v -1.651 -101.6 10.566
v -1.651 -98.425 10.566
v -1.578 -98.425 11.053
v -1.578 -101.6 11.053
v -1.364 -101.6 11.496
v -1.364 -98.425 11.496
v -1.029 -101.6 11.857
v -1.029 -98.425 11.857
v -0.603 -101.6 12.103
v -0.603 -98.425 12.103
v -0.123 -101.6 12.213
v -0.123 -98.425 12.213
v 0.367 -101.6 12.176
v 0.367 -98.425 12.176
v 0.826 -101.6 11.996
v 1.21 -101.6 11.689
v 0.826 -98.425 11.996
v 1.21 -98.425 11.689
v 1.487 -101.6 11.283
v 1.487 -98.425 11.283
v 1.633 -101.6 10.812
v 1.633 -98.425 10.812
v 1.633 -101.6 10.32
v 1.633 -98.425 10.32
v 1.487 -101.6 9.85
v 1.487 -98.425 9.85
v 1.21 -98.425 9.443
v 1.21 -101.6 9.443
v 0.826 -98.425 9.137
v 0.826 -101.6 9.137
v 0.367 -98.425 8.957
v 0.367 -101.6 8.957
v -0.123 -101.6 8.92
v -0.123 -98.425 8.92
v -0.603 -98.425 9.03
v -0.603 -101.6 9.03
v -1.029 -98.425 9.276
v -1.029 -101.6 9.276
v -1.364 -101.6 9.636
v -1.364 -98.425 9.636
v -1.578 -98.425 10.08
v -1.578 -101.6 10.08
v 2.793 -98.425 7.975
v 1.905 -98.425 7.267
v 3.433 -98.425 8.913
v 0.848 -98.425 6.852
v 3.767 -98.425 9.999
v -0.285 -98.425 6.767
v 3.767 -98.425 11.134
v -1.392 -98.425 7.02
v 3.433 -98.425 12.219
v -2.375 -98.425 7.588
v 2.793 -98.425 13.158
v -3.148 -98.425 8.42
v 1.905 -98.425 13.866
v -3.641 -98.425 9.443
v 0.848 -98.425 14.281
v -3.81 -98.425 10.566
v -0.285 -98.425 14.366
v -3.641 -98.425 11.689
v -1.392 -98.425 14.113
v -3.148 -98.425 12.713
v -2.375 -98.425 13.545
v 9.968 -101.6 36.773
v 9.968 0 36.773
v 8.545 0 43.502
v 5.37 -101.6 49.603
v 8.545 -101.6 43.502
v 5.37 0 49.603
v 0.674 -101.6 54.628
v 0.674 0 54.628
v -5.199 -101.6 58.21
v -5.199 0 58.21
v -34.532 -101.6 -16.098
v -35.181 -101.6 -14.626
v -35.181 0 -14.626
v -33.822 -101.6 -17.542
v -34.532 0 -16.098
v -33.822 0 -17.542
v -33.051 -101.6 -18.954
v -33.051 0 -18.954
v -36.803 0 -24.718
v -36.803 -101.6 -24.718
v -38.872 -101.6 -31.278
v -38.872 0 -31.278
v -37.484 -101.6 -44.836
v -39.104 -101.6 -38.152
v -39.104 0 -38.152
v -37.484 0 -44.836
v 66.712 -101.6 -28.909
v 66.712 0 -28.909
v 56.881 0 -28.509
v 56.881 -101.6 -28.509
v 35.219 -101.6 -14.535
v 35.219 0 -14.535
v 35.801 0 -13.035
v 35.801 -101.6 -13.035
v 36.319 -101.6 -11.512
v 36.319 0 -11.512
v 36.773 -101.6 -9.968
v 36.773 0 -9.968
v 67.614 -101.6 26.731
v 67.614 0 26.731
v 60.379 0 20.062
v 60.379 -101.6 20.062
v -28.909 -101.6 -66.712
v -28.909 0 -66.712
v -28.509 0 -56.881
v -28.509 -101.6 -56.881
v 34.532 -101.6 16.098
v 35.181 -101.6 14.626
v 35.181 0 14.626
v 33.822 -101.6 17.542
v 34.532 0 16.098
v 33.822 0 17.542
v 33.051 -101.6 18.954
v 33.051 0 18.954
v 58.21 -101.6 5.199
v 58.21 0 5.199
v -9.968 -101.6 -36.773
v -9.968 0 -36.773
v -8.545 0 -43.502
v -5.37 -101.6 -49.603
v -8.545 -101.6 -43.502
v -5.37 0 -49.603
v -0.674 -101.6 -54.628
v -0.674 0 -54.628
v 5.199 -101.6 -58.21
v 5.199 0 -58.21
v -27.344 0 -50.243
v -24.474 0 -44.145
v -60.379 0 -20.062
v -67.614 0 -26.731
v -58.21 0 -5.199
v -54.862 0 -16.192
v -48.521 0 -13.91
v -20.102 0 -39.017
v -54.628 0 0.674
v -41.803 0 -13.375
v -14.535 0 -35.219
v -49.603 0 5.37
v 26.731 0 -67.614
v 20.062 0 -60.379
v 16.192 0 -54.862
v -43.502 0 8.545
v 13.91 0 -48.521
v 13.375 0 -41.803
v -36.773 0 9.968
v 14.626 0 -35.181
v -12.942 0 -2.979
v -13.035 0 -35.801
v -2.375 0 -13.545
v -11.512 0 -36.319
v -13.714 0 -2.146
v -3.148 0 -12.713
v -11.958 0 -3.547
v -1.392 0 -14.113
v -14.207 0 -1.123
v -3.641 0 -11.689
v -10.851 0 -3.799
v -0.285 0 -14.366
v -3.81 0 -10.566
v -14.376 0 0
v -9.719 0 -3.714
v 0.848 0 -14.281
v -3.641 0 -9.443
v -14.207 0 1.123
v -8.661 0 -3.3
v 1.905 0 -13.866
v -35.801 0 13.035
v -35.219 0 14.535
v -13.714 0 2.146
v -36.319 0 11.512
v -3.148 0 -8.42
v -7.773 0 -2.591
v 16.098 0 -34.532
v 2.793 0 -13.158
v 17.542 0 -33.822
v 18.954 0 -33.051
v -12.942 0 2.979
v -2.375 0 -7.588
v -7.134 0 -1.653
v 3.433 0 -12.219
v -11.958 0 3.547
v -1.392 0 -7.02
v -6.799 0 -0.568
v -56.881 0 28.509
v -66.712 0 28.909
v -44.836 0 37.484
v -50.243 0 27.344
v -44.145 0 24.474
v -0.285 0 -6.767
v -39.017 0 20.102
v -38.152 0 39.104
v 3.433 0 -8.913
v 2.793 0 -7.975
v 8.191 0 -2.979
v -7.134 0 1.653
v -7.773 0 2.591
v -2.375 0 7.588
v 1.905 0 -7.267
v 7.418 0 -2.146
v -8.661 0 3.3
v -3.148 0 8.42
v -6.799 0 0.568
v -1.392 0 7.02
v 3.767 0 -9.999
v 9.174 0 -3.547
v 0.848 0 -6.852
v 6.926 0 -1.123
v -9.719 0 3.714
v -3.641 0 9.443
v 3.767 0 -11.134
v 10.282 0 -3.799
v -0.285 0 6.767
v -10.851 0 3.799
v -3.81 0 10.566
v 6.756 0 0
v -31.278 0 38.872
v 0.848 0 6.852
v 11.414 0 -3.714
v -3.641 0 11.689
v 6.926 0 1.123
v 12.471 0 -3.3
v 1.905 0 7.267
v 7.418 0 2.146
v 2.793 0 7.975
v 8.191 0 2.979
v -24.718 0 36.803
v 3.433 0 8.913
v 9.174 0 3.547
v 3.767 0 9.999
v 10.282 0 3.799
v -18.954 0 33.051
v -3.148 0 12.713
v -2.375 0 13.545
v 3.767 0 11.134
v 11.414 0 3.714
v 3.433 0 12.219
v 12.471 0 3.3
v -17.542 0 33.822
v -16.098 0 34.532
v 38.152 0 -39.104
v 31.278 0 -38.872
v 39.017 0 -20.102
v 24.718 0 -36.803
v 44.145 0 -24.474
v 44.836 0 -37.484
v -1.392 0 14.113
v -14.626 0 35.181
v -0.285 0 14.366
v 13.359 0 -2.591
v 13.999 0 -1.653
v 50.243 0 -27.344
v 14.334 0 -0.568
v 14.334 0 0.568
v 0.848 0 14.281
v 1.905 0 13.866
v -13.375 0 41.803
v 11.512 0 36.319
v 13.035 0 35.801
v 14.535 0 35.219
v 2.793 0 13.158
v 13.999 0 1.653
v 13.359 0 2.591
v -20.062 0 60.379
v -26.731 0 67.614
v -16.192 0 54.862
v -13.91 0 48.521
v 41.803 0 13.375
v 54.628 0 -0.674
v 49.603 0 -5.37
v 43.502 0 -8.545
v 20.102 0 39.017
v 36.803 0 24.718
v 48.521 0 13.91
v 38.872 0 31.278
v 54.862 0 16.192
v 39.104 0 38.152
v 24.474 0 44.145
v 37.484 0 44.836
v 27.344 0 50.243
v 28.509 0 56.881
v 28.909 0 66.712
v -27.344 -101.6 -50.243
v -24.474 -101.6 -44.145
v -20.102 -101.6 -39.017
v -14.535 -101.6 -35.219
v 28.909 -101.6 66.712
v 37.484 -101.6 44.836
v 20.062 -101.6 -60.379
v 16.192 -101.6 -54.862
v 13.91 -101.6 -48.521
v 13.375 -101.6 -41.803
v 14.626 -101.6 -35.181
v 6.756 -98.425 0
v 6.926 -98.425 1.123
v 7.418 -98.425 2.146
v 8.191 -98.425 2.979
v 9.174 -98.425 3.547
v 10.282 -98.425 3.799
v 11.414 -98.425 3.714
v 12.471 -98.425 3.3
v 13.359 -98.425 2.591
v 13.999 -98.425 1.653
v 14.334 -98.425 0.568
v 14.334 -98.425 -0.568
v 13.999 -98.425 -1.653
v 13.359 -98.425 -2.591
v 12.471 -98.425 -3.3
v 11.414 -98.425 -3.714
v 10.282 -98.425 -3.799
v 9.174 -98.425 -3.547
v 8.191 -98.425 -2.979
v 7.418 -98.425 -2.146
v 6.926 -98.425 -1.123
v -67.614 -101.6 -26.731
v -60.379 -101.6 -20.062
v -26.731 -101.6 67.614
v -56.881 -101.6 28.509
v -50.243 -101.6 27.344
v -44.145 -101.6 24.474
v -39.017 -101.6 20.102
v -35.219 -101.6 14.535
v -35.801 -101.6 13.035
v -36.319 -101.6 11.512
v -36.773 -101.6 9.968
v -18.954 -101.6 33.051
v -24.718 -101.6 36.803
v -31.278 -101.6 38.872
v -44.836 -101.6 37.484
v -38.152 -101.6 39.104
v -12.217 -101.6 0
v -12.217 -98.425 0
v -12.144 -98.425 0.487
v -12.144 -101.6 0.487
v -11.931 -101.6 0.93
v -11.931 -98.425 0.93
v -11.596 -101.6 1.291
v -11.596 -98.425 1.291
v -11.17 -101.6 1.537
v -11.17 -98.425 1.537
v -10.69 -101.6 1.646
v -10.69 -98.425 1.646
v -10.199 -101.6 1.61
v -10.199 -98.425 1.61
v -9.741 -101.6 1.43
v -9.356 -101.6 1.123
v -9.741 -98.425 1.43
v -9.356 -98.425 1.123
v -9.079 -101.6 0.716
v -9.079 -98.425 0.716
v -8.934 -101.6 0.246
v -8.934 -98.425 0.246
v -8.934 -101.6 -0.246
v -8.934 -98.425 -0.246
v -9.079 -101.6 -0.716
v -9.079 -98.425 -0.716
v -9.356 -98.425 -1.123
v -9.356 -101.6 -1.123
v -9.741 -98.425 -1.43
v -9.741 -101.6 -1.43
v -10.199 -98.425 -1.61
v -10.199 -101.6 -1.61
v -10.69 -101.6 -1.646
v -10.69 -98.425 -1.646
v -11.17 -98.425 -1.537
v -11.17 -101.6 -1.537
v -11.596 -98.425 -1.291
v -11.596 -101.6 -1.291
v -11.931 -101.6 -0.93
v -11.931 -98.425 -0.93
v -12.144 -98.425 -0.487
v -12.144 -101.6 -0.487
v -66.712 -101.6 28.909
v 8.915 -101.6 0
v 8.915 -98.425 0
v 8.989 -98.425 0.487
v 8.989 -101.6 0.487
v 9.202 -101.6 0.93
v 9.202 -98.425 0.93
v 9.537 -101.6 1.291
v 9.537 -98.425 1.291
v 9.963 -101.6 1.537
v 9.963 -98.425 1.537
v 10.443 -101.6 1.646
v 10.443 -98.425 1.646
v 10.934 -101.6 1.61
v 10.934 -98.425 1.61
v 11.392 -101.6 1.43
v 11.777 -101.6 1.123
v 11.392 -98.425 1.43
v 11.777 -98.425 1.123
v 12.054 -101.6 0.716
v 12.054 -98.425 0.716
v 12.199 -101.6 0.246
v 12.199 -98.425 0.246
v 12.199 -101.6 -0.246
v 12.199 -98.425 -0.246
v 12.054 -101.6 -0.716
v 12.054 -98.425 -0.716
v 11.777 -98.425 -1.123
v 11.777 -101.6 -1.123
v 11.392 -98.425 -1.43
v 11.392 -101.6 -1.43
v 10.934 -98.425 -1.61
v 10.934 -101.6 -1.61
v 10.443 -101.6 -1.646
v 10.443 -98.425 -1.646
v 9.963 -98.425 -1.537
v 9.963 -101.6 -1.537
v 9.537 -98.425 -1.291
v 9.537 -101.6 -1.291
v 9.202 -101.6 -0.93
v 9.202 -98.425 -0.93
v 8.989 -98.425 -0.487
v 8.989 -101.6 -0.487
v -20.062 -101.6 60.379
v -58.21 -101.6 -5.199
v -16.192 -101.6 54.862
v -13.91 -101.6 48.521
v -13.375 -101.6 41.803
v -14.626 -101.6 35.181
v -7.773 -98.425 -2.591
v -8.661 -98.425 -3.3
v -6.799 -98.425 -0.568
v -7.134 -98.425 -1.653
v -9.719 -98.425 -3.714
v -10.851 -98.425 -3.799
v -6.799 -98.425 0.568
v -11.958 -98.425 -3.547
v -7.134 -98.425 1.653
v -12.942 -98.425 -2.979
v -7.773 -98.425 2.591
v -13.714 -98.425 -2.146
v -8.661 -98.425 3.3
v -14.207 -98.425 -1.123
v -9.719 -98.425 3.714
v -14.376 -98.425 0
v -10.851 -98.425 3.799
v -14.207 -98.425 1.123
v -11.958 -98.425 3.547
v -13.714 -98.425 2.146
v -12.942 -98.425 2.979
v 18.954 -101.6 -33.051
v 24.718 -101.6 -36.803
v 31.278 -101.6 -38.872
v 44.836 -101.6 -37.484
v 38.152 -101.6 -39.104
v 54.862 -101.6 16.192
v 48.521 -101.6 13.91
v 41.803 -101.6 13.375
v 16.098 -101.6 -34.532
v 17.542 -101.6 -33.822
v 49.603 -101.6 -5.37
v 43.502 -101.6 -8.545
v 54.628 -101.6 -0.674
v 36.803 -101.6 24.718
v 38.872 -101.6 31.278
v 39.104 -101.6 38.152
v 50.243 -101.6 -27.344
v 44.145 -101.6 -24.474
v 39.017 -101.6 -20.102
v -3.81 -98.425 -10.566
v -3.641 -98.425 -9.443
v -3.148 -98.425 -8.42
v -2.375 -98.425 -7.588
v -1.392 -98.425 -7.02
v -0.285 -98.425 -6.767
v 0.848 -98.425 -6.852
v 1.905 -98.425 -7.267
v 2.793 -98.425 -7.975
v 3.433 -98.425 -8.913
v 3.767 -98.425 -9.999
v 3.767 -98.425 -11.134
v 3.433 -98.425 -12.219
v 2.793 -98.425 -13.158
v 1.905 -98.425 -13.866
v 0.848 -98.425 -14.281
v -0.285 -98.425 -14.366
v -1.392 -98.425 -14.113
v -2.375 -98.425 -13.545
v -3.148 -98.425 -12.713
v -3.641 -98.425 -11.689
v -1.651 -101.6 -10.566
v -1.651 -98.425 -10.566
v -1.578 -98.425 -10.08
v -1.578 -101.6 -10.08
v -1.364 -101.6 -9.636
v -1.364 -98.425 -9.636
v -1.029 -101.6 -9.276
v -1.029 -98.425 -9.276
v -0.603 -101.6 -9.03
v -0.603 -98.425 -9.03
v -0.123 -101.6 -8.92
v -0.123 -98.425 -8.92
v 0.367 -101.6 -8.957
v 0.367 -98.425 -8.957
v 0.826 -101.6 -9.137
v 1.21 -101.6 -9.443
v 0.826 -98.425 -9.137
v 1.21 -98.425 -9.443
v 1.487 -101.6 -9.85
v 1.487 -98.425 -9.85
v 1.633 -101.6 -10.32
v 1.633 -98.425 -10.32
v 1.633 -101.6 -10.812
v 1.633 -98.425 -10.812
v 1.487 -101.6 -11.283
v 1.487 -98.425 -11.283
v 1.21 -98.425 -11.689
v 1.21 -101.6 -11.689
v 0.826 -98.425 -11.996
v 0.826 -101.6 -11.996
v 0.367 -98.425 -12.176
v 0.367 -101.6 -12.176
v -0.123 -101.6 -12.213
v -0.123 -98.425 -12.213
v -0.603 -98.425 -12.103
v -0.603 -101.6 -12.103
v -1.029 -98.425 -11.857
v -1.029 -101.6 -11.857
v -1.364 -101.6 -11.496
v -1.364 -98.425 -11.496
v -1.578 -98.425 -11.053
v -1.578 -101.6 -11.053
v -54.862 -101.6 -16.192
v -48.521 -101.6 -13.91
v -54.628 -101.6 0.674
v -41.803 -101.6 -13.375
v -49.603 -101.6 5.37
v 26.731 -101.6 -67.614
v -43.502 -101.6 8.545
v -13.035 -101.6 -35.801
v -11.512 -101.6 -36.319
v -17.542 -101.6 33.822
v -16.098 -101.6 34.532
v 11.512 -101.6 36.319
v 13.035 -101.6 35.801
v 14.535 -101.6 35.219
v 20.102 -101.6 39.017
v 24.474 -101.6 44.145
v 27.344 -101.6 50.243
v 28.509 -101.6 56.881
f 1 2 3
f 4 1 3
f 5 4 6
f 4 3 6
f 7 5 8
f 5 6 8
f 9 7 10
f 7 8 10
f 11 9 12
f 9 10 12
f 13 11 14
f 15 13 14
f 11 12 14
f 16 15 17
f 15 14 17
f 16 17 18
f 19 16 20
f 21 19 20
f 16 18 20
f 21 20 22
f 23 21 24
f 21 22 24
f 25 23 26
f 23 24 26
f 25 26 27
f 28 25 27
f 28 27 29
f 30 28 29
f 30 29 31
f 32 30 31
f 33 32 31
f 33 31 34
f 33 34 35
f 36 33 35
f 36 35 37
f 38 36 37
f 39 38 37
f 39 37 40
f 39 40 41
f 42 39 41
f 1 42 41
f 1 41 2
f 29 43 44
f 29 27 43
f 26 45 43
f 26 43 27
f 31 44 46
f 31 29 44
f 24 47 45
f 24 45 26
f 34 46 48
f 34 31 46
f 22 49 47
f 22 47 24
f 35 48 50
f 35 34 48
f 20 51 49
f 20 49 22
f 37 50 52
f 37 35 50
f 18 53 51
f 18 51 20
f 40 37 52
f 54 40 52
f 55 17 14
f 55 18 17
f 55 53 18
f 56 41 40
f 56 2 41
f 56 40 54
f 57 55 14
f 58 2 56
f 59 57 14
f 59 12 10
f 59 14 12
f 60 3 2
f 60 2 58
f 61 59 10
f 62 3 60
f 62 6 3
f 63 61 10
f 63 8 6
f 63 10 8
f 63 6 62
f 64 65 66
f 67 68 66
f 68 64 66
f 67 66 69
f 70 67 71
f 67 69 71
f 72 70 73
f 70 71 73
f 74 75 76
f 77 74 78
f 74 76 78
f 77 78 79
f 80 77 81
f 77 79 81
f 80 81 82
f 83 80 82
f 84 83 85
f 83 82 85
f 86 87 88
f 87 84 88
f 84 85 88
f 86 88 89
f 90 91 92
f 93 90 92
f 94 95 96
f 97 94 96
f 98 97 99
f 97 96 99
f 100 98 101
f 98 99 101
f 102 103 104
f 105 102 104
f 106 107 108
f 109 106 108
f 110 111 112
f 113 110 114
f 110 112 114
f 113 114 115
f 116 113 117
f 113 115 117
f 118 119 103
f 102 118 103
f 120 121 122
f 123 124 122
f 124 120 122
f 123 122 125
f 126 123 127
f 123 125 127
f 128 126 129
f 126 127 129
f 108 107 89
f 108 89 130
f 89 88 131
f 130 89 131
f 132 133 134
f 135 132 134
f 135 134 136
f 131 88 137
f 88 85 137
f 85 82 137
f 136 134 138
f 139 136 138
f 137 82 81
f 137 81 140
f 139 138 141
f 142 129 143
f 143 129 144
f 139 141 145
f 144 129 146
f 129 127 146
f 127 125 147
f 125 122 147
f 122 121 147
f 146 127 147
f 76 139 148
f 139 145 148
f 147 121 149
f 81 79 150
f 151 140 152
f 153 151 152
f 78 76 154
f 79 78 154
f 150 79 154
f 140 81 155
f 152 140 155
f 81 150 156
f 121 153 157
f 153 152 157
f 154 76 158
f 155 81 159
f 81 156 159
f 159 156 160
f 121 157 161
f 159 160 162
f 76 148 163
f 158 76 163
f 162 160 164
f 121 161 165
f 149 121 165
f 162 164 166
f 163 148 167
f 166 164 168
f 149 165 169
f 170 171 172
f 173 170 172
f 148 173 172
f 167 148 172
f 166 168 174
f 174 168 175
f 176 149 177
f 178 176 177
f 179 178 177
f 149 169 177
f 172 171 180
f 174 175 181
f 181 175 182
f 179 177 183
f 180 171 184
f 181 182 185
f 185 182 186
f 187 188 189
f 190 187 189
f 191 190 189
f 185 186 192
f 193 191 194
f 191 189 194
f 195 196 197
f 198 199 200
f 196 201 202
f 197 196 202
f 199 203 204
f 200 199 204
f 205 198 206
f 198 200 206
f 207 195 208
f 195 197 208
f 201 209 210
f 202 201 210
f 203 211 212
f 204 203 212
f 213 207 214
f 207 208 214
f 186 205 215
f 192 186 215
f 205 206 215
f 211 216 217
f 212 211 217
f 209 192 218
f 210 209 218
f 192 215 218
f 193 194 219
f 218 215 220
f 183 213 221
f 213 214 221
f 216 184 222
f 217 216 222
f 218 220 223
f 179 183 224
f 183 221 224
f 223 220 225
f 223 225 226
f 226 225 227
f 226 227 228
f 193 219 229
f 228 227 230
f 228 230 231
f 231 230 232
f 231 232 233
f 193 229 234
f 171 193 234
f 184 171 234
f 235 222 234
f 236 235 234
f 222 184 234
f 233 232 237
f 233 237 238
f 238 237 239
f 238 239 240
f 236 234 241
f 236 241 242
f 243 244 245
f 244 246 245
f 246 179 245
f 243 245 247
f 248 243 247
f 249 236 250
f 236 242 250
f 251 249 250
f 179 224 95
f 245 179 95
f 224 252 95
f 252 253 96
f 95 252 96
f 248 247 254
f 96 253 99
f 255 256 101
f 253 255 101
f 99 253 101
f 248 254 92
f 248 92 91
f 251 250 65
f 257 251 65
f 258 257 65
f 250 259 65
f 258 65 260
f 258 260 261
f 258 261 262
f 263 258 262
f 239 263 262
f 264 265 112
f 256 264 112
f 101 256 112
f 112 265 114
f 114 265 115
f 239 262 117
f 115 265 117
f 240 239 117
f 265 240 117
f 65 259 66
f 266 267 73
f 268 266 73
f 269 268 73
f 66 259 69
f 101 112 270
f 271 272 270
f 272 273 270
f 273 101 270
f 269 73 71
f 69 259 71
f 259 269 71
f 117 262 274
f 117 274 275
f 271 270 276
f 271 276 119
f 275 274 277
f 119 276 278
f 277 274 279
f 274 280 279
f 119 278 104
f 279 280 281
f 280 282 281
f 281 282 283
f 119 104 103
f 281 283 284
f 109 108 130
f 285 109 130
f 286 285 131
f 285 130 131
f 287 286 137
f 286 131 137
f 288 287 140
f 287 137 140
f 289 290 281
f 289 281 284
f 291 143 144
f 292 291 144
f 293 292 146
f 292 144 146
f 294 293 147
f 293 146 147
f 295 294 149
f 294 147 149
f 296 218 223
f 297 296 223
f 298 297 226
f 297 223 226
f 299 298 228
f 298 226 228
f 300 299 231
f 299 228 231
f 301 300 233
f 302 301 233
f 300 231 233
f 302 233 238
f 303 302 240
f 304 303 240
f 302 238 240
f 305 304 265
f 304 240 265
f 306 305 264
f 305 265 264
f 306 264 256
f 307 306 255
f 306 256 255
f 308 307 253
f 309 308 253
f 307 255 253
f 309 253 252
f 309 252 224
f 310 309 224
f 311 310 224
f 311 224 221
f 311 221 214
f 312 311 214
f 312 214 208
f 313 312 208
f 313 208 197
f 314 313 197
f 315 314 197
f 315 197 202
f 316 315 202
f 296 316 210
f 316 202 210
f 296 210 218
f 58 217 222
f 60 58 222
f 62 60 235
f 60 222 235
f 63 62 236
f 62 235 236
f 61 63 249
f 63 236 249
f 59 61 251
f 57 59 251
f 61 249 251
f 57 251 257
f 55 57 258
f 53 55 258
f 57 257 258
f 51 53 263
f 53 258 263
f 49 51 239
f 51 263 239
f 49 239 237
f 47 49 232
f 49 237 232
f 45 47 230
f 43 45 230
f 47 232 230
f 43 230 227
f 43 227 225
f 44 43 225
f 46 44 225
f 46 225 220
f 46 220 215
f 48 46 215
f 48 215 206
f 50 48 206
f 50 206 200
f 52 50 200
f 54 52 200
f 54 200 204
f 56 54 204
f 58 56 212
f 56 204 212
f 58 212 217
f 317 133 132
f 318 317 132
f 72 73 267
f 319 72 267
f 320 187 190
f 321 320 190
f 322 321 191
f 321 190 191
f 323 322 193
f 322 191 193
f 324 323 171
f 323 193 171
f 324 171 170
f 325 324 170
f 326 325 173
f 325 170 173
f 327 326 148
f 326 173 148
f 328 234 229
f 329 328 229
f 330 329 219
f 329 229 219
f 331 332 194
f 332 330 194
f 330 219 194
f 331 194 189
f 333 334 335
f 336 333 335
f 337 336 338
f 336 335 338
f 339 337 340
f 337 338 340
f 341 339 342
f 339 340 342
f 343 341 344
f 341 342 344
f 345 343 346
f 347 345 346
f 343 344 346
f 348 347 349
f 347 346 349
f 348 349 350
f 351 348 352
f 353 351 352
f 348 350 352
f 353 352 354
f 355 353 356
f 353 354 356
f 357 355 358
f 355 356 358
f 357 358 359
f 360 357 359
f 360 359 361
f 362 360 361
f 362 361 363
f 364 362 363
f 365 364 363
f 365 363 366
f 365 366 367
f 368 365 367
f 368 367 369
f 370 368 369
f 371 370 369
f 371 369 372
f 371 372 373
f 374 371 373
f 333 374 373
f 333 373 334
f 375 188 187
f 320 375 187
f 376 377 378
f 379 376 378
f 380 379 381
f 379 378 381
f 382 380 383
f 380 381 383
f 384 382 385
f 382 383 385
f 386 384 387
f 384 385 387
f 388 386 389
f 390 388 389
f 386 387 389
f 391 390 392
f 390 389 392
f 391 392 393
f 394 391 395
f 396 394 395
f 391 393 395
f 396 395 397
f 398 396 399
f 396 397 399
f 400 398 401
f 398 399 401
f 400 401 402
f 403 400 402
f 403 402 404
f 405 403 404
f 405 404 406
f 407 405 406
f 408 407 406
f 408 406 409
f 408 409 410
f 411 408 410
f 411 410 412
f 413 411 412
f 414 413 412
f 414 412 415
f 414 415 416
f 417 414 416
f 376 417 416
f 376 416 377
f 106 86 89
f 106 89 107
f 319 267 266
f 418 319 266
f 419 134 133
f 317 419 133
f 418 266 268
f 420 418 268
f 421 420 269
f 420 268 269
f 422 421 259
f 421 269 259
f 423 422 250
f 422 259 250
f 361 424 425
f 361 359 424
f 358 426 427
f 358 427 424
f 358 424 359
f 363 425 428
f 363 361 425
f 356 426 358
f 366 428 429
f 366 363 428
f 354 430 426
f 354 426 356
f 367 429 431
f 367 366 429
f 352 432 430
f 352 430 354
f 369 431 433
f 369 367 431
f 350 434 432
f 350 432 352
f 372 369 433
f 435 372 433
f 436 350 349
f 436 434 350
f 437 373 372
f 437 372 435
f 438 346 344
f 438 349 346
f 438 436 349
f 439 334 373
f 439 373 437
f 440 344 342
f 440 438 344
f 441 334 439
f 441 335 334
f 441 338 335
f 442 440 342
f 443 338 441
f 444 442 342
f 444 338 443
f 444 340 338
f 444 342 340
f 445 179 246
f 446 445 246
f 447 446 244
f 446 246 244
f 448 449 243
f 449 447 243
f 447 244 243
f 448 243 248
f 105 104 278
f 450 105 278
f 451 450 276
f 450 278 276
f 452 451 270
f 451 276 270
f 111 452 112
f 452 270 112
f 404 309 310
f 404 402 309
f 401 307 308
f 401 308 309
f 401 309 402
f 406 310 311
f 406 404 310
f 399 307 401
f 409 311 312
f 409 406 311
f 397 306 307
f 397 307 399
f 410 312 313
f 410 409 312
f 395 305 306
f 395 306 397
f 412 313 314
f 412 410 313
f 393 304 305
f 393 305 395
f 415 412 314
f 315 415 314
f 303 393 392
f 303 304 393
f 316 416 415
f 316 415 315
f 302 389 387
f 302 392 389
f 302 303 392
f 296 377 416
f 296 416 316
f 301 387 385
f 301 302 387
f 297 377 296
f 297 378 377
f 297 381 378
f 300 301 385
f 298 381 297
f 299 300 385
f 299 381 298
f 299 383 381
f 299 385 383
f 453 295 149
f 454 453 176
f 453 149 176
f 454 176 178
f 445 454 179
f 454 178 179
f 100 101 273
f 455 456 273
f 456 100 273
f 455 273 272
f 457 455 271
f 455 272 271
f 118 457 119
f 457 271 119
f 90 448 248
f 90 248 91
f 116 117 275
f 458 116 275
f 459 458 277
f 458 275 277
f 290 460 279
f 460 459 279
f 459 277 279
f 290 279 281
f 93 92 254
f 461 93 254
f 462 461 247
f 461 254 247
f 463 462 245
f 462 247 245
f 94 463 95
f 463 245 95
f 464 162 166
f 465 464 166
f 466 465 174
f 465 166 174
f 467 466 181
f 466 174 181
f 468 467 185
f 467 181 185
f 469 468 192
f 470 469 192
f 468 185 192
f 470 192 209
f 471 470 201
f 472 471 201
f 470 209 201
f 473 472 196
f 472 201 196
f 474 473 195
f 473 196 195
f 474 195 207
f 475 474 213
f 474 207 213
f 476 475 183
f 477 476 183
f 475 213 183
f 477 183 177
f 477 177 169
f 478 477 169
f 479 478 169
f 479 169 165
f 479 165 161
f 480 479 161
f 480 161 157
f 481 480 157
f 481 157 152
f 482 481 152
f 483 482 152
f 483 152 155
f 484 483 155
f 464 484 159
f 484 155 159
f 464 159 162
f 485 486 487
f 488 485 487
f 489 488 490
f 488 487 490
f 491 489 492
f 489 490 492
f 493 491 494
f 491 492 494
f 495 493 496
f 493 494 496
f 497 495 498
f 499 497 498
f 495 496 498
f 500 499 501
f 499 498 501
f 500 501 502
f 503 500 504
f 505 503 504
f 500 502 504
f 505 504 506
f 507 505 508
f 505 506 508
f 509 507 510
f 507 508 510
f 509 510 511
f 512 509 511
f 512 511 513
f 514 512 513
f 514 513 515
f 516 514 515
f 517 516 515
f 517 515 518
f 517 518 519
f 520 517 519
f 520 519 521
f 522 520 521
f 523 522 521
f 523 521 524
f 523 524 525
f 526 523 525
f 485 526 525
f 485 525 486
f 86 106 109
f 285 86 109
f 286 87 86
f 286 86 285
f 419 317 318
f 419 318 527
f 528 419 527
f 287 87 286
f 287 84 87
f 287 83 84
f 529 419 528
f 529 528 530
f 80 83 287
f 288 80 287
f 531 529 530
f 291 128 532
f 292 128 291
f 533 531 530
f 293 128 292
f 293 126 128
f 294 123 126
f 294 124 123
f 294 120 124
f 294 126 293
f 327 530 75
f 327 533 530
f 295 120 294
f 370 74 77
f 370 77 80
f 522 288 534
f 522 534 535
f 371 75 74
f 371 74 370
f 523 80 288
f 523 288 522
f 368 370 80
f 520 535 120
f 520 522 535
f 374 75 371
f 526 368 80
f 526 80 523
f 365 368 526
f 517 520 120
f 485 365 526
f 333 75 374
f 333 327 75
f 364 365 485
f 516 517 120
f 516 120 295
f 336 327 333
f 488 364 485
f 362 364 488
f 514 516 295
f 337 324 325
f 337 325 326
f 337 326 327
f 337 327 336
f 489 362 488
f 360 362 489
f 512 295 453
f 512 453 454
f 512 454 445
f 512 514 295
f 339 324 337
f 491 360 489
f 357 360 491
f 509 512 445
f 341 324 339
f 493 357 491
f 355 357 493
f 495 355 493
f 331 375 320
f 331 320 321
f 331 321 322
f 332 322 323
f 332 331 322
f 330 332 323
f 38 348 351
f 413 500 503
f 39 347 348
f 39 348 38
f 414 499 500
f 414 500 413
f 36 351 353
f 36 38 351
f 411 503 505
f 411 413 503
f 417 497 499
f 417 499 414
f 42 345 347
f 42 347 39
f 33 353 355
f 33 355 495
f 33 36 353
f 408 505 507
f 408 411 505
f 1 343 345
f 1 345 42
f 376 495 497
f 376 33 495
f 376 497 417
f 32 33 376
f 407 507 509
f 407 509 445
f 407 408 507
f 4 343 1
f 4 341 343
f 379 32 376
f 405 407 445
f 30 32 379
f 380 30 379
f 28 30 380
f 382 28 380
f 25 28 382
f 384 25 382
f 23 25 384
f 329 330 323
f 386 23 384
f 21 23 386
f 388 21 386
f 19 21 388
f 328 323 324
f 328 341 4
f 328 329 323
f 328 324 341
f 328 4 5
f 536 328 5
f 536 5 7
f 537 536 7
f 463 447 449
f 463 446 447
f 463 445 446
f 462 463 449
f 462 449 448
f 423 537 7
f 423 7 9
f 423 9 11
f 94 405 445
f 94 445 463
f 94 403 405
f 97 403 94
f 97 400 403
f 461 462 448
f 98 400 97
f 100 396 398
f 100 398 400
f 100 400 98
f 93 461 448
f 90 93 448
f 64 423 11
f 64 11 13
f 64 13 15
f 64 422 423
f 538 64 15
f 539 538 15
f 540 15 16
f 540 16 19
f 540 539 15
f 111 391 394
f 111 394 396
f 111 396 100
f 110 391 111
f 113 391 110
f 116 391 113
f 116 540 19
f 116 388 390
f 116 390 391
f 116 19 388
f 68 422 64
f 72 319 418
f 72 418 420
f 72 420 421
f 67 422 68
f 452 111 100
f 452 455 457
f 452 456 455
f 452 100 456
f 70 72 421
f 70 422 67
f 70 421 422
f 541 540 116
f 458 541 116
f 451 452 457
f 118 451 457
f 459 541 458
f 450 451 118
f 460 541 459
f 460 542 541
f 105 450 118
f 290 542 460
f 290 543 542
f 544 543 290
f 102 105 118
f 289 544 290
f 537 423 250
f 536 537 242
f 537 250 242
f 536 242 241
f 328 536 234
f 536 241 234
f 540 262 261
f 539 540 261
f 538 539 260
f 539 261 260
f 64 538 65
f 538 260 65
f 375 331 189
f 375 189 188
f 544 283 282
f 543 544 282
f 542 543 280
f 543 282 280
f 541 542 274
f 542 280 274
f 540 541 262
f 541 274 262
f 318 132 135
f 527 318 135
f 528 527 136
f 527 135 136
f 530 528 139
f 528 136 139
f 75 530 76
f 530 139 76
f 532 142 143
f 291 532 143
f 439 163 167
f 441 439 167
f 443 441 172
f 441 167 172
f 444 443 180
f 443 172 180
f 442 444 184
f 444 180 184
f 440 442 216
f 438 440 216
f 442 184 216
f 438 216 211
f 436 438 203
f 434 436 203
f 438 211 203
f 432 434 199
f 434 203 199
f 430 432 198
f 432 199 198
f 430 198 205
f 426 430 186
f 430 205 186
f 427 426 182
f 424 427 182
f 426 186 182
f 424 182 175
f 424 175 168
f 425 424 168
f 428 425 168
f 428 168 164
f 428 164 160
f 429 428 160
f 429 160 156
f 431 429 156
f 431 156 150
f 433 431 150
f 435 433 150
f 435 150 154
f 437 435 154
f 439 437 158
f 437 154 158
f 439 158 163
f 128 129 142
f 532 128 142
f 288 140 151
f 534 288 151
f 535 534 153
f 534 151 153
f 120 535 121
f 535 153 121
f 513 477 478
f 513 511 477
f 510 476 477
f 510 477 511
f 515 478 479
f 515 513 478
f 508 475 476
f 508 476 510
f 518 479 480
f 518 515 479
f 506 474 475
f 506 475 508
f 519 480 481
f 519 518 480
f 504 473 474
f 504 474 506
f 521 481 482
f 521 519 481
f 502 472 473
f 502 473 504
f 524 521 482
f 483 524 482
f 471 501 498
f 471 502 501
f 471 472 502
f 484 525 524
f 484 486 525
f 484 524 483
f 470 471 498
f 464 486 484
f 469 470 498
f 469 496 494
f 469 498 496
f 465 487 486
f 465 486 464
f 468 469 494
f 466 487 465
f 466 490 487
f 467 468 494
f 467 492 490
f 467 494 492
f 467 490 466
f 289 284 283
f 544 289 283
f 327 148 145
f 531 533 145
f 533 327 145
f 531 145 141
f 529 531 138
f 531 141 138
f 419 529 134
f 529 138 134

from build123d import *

# Parameters (mm, degrees)
F1_DEPTH    = 101.6
F2_T1_DEPTH = 101.6
F2_T3_DEPTH = 213.9945264783
F3_R        = 1.651
F4_DEPTH    = 127
F5_R        = 3.81
F5_R_2      = 1.651
F6_DEPTH    = 98.425


# Not quite as in the source:
# - a fillet or chamfer that OpenCascade refuses, or shapes differently, is made with other operations: its cross-section is extruded or revolved along the edge and cut away or added


with BuildPart() as f1:
    # F0 (on Front) → F1 (new body)
    with BuildSketch(Plane.XZ):
        with BuildLine():
            ThreePointArc((36.7729649274, -9.9679010051), (37.7667841081, -5.0279238392), (38.1, 0))
            ThreePointArc((38.1, 0), (37.363123518, 7.4570101903), (35.1809973239, 14.6255744261))
            ThreePointArc((35.1809973239, 14.6255744261), (34.1844683928, 16.823558503), (33.0507832594, 18.9540424696))
            ThreePointArc((33.0507832594, 18.9540424696), (25.1442335653, 28.6247710631), (14.5348789212, 35.2185646321))
            ThreePointArc((14.5348789212, 35.2185646321), (12.2760171106, 36.068121713), (9.9679010051, 36.7729649274))
            ThreePointArc((9.9679010051, 36.7729649274), (-2.4611116668, 38.0204277904), (-14.6255744261, 35.1809973239))
            ThreePointArc((-14.6255744261, 35.1809973239), (-16.823558503, 34.1844683928), (-18.9540424696, 33.0507832594))
            ThreePointArc((-18.9540424696, 33.0507832594), (-28.6247710631, 25.1442335653), (-35.2185646321, 14.5348789212))
            ThreePointArc((-35.2185646321, 14.5348789212), (-36.068121713, 12.2760171106), (-36.7729649274, 9.9679010051))
            ThreePointArc((-36.7729649274, 9.9679010051), (-38.0204277904, -2.4611116668), (-35.1809973239, -14.6255744261))
            ThreePointArc((-35.1809973239, -14.6255744261), (-34.1844683928, -16.823558503), (-33.0507832594, -18.9540424696))
            ThreePointArc((-33.0507832594, -18.9540424696), (-25.1442335653, -28.6247710631), (-14.5348789212, -35.2185646321))
            ThreePointArc((-14.5348789212, -35.2185646321), (-12.2760171106, -36.068121713), (-9.9679010051, -36.7729649274))
            ThreePointArc((-9.9679010051, -36.7729649274), (2.4611116668, -38.0204277904), (14.6255744261, -35.1809973239))
            ThreePointArc((14.6255744261, -35.1809973239), (16.823558503, -34.1844683928), (18.9540424696, -33.0507832594))
            ThreePointArc((18.9540424696, -33.0507832594), (28.6247710631, -25.1442335653), (35.2185646321, -14.5348789212))
            ThreePointArc((35.2185646321, -14.5348789212), (36.068121713, -12.2760171106), (36.7729649274, -9.9679010051))
        make_face()
        with BuildLine():
            ThreePointArc((-35.2185646321, 14.5348789212), (-28.6247710631, 25.1442335653), (-18.9540424696, 33.0507832594))
            Line((-18.9540424696, 33.0507832594), (-23.9079516621, 45.688308647))
            Line((-23.9079516621, 45.688308647), (-66.712088778, 28.9090894698))
            Line((-66.712088778, 28.9090894698), (-41.705504873, 27.890755436))
            Line((-41.705504873, 27.890755436), (-35.2185646321, 14.5348789212))
        make_face()
        with BuildLine():
            ThreePointArc((-14.6255744261, 35.1809973239), (-2.4611116668, 38.0204277904), (9.9679010051, 36.7729649274))
            Line((9.9679010051, 36.7729649274), (15.4010381207, 49.2119876098))
            Line((15.4010381207, 49.2119876098), (-26.7307571601, 67.6143835641))
            Line((-26.7307571601, 67.6143835641), (-9.7685030073, 49.2119876098))
            Line((-9.7685030073, 49.2119876098), (-14.6255744261, 35.1809973239))
        make_face()
        with BuildLine():
            ThreePointArc((14.5348789212, 35.2185646321), (25.1442335653, 28.6247710631), (33.0507832594, 18.9540424696))
            Line((33.0507832594, 18.9540424696), (45.688308647, 23.9079516621))
            Line((45.688308647, 23.9079516621), (28.9090894698, 66.712088778))
            Line((28.9090894698, 66.712088778), (27.890755436, 41.705504873))
            Line((27.890755436, 41.705504873), (14.5348789212, 35.2185646321))
        make_face()
        with BuildLine():
            ThreePointArc((35.1809973239, 14.6255744261), (37.363123518, 7.4570101903), (38.1, 0))
            ThreePointArc((38.1, 0), (37.7667841081, -5.0279238392), (36.7729649274, -9.9679010051))
            Line((36.7729649274, -9.9679010051), (49.2119876098, -15.4010381207))
            Line((49.2119876098, -15.4010381207), (67.6143835641, 26.7307571601))
            Line((67.6143835641, 26.7307571601), (49.2119876098, 9.7685030073))
            Line((49.2119876098, 9.7685030073), (35.1809973239, 14.6255744261))
        make_face()
        with BuildLine():
            Line((41.705504873, -27.890755436), (35.2185646321, -14.5348789212))
            ThreePointArc((35.2185646321, -14.5348789212), (28.6247710631, -25.1442335653), (18.9540424696, -33.0507832594))
            Line((18.9540424696, -33.0507832594), (23.9079516621, -45.688308647))
            Line((23.9079516621, -45.688308647), (66.712088778, -28.9090894698))
            Line((66.712088778, -28.9090894698), (41.705504873, -27.890755436))
        make_face()
        with BuildLine():
            Line((9.7685030073, -49.2119876098), (14.6255744261, -35.1809973239))
            ThreePointArc((14.6255744261, -35.1809973239), (2.4611116668, -38.0204277904), (-9.9679010051, -36.7729649274))
            Line((-9.9679010051, -36.7729649274), (-15.4010381207, -49.2119876098))
            Line((-15.4010381207, -49.2119876098), (26.7307571601, -67.6143835641))
            Line((26.7307571601, -67.6143835641), (9.7685030073, -49.2119876098))
        make_face()
        with BuildLine():
            Line((-27.890755436, -41.705504873), (-14.5348789212, -35.2185646321))
            ThreePointArc((-14.5348789212, -35.2185646321), (-25.1442335653, -28.6247710631), (-33.0507832594, -18.9540424696))
            Line((-33.0507832594, -18.9540424696), (-45.688308647, -23.9079516621))
            Line((-45.688308647, -23.9079516621), (-28.9090894698, -66.712088778))
            Line((-28.9090894698, -66.712088778), (-27.890755436, -41.705504873))
        make_face()
        with BuildLine():
            ThreePointArc((-35.1809973239, -14.6255744261), (-38.0204277904, -2.4611116668), (-36.7729649274, 9.9679010051))
            Line((-36.7729649274, 9.9679010051), (-49.2119876098, 15.4010381207))
            Line((-49.2119876098, 15.4010381207), (-67.6143835641, -26.7307571601))
            Line((-67.6143835641, -26.7307571601), (-49.2119876098, -9.7685030073))
            Line((-49.2119876098, -9.7685030073), (-35.1809973239, -14.6255744261))
        make_face()
    extrude(amount=F1_DEPTH)

    # F2: fillet of radius 25.4 on 16 edges, made by hand

    # F2_s2 → F2_t1 (join)
    with BuildSketch(Plane.XZ):
        with BuildLine():
            ThreePointArc((-56.8805102577, 28.5087216686), (-44.1451035636, 24.4740120759), (-35.2185646321, 14.5348789212))
            Line((-35.2185646321, 14.5348789212), (-41.705504873, 27.890755436))
            Line((-41.705504873, 27.890755436), (-56.8805102577, 28.5087216686))
        make_face()
        with BuildLine():
            ThreePointArc((-60.3793049354, -20.0618841058), (-48.5210419877, -13.9095621843), (-35.1809973239, -14.6255744261))
            Line((-35.1809973239, -14.6255744261), (-49.2119876098, -9.7685030073))
            Line((-49.2119876098, -9.7685030073), (-60.3793049354, -20.0618841058))
        make_face()
        with BuildLine():
            ThreePointArc((-28.5087216686, -56.8805102577), (-24.4740120759, -44.1451035636), (-14.5348789212, -35.2185646321))
            Line((-14.5348789212, -35.2185646321), (-27.890755436, -41.705504873))
            Line((-27.890755436, -41.705504873), (-28.5087216686, -56.8805102577))
        make_face()
        with BuildLine():
            ThreePointArc((20.0618841058, -60.3793049354), (13.9095621843, -48.5210419877), (14.6255744261, -35.1809973239))
            Line((14.6255744261, -35.1809973239), (9.7685030073, -49.2119876098))
            Line((9.7685030073, -49.2119876098), (20.0618841058, -60.3793049354))
        make_face()
        with BuildLine():
            ThreePointArc((56.8805102577, -28.5087216686), (44.1451035636, -24.4740120759), (35.2185646321, -14.5348789212))
            Line((35.2185646321, -14.5348789212), (41.705504873, -27.890755436))
            Line((41.705504873, -27.890755436), (56.8805102577, -28.5087216686))
        make_face()
        with BuildLine():
            ThreePointArc((60.3793049354, 20.0618841058), (48.5210419877, 13.9095621843), (35.1809973239, 14.6255744261))
            Line((35.1809973239, 14.6255744261), (49.2119876098, 9.7685030073))
            Line((49.2119876098, 9.7685030073), (60.3793049354, 20.0618841058))
        make_face()
        with BuildLine():
            ThreePointArc((28.5087216686, 56.8805102577), (24.4740120759, 44.1451035636), (14.5348789212, 35.2185646321))
            Line((14.5348789212, 35.2185646321), (27.890755436, 41.705504873))
            Line((27.890755436, 41.705504873), (28.5087216686, 56.8805102577))
        make_face()
        with BuildLine():
            ThreePointArc((-20.0618841058, 60.3793049354), (-13.9095621843, 48.5210419877), (-14.6255744261, 35.1809973239))
            Line((-14.6255744261, 35.1809973239), (-9.7685030073, 49.2119876098))
            Line((-9.7685030073, 49.2119876098), (-20.0618841058, 60.3793049354))
        make_face()
    extrude(amount=F2_T1_DEPTH)

    # F2_s4 → F2_t3 (cut)
    with BuildSketch(Plane.XZ.offset(-56.1972632391)):
        with BuildLine():
            ThreePointArc((-36.7729649274, 9.9679010051), (-49.6032208566, 5.3697394136), (-58.2095345387, -5.1986058702))
            Line((-58.2095345387, -5.1986058702), (-49.2119876098, 15.4010381207))
            Line((-49.2119876098, 15.4010381207), (-36.7729649274, 9.9679010051))
        make_face()
        with BuildLine():
            ThreePointArc((-18.9540424696, 33.0507832594), (-31.2777946839, 38.8717529889), (-44.8363260656, 37.4843871385))
            Line((-44.8363260656, 37.4843871385), (-23.9079516621, 45.688308647))
            Line((-23.9079516621, 45.688308647), (-18.9540424696, 33.0507832594))
        make_face()
        with BuildLine():
            ThreePointArc((9.9679010051, 36.7729649274), (5.3697394136, 49.6032208566), (-5.1986058702, 58.2095345387))
            Line((-5.1986058702, 58.2095345387), (15.4010381207, 49.2119876098))
            Line((15.4010381207, 49.2119876098), (9.9679010051, 36.7729649274))
        make_face()
        with BuildLine():
            ThreePointArc((33.0507832594, 18.9540424696), (38.8717529889, 31.2777946839), (37.4843871385, 44.8363260656))
            Line((37.4843871385, 44.8363260656), (45.688308647, 23.9079516621))
            Line((45.688308647, 23.9079516621), (33.0507832594, 18.9540424696))
        make_face()
        with BuildLine():
            ThreePointArc((36.7729649274, -9.9679010051), (49.6032208566, -5.3697394136), (58.2095345387, 5.1986058702))
            Line((58.2095345387, 5.1986058702), (49.2119876098, -15.4010381207))
            Line((49.2119876098, -15.4010381207), (36.7729649274, -9.9679010051))
        make_face()
        with BuildLine():
            ThreePointArc((18.9540424696, -33.0507832594), (31.2777946839, -38.8717529889), (44.8363260656, -37.4843871385))
            Line((44.8363260656, -37.4843871385), (23.9079516621, -45.688308647))
            Line((23.9079516621, -45.688308647), (18.9540424696, -33.0507832594))
        make_face()
        with BuildLine():
            ThreePointArc((-9.9679010051, -36.7729649274), (-5.3697394136, -49.6032208566), (5.1986058702, -58.2095345387))
            Line((5.1986058702, -58.2095345387), (-15.4010381207, -49.2119876098))
            Line((-15.4010381207, -49.2119876098), (-9.9679010051, -36.7729649274))
        make_face()
        with BuildLine():
            ThreePointArc((-33.0507832594, -18.9540424696), (-38.8717529889, -31.2777946839), (-37.4843871385, -44.8363260656))
            Line((-37.4843871385, -44.8363260656), (-45.688308647, -23.9079516621))
            Line((-45.688308647, -23.9079516621), (-33.0507832594, -18.9540424696))
        make_face()
    extrude(amount=F2_T3_DEPTH, mode=Mode.SUBTRACT)

    # F3 (on face) → F4 (cut)
    with BuildSketch(Plane(origin=(0, 0, 0), x_dir=(-1, 0, 0), z_dir=(0, 1, 0))):
        with Locations((0, 10.5664)):
            Circle(F3_R)
        with Locations((-10.5664, 0)):
            Circle(F3_R)
        with Locations((10.5664, 0)):
            Circle(F3_R)
        with Locations((0, -10.5664)):
            Circle(F3_R)
    extrude(amount=-F4_DEPTH, mode=Mode.SUBTRACT)

    # F5 (on face) → F6 (cut)
    with BuildSketch(Plane(origin=(0, 0, 0), x_dir=(-1, 0, 0), z_dir=(0, 1, 0))):
        with Locations((0, 10.5664)):
            Circle(F5_R)
        with Locations((0, 10.5664)):
            Circle(F5_R_2, mode=Mode.SUBTRACT)
        with Locations((10.5664, 0)):
            Circle(F5_R)
        with Locations((10.5664, 0)):
            Circle(F5_R_2, mode=Mode.SUBTRACT)
        with Locations((0, -10.5664)):
            Circle(F5_R)
        with Locations((0, -10.5664)):
            Circle(F5_R_2, mode=Mode.SUBTRACT)
        with Locations((-10.5664, 0)):
            Circle(F5_R)
        with Locations((-10.5664, 0)):
            Circle(F5_R_2, mode=Mode.SUBTRACT)
    extrude(amount=-F6_DEPTH, mode=Mode.SUBTRACT)


solid = f1.part
